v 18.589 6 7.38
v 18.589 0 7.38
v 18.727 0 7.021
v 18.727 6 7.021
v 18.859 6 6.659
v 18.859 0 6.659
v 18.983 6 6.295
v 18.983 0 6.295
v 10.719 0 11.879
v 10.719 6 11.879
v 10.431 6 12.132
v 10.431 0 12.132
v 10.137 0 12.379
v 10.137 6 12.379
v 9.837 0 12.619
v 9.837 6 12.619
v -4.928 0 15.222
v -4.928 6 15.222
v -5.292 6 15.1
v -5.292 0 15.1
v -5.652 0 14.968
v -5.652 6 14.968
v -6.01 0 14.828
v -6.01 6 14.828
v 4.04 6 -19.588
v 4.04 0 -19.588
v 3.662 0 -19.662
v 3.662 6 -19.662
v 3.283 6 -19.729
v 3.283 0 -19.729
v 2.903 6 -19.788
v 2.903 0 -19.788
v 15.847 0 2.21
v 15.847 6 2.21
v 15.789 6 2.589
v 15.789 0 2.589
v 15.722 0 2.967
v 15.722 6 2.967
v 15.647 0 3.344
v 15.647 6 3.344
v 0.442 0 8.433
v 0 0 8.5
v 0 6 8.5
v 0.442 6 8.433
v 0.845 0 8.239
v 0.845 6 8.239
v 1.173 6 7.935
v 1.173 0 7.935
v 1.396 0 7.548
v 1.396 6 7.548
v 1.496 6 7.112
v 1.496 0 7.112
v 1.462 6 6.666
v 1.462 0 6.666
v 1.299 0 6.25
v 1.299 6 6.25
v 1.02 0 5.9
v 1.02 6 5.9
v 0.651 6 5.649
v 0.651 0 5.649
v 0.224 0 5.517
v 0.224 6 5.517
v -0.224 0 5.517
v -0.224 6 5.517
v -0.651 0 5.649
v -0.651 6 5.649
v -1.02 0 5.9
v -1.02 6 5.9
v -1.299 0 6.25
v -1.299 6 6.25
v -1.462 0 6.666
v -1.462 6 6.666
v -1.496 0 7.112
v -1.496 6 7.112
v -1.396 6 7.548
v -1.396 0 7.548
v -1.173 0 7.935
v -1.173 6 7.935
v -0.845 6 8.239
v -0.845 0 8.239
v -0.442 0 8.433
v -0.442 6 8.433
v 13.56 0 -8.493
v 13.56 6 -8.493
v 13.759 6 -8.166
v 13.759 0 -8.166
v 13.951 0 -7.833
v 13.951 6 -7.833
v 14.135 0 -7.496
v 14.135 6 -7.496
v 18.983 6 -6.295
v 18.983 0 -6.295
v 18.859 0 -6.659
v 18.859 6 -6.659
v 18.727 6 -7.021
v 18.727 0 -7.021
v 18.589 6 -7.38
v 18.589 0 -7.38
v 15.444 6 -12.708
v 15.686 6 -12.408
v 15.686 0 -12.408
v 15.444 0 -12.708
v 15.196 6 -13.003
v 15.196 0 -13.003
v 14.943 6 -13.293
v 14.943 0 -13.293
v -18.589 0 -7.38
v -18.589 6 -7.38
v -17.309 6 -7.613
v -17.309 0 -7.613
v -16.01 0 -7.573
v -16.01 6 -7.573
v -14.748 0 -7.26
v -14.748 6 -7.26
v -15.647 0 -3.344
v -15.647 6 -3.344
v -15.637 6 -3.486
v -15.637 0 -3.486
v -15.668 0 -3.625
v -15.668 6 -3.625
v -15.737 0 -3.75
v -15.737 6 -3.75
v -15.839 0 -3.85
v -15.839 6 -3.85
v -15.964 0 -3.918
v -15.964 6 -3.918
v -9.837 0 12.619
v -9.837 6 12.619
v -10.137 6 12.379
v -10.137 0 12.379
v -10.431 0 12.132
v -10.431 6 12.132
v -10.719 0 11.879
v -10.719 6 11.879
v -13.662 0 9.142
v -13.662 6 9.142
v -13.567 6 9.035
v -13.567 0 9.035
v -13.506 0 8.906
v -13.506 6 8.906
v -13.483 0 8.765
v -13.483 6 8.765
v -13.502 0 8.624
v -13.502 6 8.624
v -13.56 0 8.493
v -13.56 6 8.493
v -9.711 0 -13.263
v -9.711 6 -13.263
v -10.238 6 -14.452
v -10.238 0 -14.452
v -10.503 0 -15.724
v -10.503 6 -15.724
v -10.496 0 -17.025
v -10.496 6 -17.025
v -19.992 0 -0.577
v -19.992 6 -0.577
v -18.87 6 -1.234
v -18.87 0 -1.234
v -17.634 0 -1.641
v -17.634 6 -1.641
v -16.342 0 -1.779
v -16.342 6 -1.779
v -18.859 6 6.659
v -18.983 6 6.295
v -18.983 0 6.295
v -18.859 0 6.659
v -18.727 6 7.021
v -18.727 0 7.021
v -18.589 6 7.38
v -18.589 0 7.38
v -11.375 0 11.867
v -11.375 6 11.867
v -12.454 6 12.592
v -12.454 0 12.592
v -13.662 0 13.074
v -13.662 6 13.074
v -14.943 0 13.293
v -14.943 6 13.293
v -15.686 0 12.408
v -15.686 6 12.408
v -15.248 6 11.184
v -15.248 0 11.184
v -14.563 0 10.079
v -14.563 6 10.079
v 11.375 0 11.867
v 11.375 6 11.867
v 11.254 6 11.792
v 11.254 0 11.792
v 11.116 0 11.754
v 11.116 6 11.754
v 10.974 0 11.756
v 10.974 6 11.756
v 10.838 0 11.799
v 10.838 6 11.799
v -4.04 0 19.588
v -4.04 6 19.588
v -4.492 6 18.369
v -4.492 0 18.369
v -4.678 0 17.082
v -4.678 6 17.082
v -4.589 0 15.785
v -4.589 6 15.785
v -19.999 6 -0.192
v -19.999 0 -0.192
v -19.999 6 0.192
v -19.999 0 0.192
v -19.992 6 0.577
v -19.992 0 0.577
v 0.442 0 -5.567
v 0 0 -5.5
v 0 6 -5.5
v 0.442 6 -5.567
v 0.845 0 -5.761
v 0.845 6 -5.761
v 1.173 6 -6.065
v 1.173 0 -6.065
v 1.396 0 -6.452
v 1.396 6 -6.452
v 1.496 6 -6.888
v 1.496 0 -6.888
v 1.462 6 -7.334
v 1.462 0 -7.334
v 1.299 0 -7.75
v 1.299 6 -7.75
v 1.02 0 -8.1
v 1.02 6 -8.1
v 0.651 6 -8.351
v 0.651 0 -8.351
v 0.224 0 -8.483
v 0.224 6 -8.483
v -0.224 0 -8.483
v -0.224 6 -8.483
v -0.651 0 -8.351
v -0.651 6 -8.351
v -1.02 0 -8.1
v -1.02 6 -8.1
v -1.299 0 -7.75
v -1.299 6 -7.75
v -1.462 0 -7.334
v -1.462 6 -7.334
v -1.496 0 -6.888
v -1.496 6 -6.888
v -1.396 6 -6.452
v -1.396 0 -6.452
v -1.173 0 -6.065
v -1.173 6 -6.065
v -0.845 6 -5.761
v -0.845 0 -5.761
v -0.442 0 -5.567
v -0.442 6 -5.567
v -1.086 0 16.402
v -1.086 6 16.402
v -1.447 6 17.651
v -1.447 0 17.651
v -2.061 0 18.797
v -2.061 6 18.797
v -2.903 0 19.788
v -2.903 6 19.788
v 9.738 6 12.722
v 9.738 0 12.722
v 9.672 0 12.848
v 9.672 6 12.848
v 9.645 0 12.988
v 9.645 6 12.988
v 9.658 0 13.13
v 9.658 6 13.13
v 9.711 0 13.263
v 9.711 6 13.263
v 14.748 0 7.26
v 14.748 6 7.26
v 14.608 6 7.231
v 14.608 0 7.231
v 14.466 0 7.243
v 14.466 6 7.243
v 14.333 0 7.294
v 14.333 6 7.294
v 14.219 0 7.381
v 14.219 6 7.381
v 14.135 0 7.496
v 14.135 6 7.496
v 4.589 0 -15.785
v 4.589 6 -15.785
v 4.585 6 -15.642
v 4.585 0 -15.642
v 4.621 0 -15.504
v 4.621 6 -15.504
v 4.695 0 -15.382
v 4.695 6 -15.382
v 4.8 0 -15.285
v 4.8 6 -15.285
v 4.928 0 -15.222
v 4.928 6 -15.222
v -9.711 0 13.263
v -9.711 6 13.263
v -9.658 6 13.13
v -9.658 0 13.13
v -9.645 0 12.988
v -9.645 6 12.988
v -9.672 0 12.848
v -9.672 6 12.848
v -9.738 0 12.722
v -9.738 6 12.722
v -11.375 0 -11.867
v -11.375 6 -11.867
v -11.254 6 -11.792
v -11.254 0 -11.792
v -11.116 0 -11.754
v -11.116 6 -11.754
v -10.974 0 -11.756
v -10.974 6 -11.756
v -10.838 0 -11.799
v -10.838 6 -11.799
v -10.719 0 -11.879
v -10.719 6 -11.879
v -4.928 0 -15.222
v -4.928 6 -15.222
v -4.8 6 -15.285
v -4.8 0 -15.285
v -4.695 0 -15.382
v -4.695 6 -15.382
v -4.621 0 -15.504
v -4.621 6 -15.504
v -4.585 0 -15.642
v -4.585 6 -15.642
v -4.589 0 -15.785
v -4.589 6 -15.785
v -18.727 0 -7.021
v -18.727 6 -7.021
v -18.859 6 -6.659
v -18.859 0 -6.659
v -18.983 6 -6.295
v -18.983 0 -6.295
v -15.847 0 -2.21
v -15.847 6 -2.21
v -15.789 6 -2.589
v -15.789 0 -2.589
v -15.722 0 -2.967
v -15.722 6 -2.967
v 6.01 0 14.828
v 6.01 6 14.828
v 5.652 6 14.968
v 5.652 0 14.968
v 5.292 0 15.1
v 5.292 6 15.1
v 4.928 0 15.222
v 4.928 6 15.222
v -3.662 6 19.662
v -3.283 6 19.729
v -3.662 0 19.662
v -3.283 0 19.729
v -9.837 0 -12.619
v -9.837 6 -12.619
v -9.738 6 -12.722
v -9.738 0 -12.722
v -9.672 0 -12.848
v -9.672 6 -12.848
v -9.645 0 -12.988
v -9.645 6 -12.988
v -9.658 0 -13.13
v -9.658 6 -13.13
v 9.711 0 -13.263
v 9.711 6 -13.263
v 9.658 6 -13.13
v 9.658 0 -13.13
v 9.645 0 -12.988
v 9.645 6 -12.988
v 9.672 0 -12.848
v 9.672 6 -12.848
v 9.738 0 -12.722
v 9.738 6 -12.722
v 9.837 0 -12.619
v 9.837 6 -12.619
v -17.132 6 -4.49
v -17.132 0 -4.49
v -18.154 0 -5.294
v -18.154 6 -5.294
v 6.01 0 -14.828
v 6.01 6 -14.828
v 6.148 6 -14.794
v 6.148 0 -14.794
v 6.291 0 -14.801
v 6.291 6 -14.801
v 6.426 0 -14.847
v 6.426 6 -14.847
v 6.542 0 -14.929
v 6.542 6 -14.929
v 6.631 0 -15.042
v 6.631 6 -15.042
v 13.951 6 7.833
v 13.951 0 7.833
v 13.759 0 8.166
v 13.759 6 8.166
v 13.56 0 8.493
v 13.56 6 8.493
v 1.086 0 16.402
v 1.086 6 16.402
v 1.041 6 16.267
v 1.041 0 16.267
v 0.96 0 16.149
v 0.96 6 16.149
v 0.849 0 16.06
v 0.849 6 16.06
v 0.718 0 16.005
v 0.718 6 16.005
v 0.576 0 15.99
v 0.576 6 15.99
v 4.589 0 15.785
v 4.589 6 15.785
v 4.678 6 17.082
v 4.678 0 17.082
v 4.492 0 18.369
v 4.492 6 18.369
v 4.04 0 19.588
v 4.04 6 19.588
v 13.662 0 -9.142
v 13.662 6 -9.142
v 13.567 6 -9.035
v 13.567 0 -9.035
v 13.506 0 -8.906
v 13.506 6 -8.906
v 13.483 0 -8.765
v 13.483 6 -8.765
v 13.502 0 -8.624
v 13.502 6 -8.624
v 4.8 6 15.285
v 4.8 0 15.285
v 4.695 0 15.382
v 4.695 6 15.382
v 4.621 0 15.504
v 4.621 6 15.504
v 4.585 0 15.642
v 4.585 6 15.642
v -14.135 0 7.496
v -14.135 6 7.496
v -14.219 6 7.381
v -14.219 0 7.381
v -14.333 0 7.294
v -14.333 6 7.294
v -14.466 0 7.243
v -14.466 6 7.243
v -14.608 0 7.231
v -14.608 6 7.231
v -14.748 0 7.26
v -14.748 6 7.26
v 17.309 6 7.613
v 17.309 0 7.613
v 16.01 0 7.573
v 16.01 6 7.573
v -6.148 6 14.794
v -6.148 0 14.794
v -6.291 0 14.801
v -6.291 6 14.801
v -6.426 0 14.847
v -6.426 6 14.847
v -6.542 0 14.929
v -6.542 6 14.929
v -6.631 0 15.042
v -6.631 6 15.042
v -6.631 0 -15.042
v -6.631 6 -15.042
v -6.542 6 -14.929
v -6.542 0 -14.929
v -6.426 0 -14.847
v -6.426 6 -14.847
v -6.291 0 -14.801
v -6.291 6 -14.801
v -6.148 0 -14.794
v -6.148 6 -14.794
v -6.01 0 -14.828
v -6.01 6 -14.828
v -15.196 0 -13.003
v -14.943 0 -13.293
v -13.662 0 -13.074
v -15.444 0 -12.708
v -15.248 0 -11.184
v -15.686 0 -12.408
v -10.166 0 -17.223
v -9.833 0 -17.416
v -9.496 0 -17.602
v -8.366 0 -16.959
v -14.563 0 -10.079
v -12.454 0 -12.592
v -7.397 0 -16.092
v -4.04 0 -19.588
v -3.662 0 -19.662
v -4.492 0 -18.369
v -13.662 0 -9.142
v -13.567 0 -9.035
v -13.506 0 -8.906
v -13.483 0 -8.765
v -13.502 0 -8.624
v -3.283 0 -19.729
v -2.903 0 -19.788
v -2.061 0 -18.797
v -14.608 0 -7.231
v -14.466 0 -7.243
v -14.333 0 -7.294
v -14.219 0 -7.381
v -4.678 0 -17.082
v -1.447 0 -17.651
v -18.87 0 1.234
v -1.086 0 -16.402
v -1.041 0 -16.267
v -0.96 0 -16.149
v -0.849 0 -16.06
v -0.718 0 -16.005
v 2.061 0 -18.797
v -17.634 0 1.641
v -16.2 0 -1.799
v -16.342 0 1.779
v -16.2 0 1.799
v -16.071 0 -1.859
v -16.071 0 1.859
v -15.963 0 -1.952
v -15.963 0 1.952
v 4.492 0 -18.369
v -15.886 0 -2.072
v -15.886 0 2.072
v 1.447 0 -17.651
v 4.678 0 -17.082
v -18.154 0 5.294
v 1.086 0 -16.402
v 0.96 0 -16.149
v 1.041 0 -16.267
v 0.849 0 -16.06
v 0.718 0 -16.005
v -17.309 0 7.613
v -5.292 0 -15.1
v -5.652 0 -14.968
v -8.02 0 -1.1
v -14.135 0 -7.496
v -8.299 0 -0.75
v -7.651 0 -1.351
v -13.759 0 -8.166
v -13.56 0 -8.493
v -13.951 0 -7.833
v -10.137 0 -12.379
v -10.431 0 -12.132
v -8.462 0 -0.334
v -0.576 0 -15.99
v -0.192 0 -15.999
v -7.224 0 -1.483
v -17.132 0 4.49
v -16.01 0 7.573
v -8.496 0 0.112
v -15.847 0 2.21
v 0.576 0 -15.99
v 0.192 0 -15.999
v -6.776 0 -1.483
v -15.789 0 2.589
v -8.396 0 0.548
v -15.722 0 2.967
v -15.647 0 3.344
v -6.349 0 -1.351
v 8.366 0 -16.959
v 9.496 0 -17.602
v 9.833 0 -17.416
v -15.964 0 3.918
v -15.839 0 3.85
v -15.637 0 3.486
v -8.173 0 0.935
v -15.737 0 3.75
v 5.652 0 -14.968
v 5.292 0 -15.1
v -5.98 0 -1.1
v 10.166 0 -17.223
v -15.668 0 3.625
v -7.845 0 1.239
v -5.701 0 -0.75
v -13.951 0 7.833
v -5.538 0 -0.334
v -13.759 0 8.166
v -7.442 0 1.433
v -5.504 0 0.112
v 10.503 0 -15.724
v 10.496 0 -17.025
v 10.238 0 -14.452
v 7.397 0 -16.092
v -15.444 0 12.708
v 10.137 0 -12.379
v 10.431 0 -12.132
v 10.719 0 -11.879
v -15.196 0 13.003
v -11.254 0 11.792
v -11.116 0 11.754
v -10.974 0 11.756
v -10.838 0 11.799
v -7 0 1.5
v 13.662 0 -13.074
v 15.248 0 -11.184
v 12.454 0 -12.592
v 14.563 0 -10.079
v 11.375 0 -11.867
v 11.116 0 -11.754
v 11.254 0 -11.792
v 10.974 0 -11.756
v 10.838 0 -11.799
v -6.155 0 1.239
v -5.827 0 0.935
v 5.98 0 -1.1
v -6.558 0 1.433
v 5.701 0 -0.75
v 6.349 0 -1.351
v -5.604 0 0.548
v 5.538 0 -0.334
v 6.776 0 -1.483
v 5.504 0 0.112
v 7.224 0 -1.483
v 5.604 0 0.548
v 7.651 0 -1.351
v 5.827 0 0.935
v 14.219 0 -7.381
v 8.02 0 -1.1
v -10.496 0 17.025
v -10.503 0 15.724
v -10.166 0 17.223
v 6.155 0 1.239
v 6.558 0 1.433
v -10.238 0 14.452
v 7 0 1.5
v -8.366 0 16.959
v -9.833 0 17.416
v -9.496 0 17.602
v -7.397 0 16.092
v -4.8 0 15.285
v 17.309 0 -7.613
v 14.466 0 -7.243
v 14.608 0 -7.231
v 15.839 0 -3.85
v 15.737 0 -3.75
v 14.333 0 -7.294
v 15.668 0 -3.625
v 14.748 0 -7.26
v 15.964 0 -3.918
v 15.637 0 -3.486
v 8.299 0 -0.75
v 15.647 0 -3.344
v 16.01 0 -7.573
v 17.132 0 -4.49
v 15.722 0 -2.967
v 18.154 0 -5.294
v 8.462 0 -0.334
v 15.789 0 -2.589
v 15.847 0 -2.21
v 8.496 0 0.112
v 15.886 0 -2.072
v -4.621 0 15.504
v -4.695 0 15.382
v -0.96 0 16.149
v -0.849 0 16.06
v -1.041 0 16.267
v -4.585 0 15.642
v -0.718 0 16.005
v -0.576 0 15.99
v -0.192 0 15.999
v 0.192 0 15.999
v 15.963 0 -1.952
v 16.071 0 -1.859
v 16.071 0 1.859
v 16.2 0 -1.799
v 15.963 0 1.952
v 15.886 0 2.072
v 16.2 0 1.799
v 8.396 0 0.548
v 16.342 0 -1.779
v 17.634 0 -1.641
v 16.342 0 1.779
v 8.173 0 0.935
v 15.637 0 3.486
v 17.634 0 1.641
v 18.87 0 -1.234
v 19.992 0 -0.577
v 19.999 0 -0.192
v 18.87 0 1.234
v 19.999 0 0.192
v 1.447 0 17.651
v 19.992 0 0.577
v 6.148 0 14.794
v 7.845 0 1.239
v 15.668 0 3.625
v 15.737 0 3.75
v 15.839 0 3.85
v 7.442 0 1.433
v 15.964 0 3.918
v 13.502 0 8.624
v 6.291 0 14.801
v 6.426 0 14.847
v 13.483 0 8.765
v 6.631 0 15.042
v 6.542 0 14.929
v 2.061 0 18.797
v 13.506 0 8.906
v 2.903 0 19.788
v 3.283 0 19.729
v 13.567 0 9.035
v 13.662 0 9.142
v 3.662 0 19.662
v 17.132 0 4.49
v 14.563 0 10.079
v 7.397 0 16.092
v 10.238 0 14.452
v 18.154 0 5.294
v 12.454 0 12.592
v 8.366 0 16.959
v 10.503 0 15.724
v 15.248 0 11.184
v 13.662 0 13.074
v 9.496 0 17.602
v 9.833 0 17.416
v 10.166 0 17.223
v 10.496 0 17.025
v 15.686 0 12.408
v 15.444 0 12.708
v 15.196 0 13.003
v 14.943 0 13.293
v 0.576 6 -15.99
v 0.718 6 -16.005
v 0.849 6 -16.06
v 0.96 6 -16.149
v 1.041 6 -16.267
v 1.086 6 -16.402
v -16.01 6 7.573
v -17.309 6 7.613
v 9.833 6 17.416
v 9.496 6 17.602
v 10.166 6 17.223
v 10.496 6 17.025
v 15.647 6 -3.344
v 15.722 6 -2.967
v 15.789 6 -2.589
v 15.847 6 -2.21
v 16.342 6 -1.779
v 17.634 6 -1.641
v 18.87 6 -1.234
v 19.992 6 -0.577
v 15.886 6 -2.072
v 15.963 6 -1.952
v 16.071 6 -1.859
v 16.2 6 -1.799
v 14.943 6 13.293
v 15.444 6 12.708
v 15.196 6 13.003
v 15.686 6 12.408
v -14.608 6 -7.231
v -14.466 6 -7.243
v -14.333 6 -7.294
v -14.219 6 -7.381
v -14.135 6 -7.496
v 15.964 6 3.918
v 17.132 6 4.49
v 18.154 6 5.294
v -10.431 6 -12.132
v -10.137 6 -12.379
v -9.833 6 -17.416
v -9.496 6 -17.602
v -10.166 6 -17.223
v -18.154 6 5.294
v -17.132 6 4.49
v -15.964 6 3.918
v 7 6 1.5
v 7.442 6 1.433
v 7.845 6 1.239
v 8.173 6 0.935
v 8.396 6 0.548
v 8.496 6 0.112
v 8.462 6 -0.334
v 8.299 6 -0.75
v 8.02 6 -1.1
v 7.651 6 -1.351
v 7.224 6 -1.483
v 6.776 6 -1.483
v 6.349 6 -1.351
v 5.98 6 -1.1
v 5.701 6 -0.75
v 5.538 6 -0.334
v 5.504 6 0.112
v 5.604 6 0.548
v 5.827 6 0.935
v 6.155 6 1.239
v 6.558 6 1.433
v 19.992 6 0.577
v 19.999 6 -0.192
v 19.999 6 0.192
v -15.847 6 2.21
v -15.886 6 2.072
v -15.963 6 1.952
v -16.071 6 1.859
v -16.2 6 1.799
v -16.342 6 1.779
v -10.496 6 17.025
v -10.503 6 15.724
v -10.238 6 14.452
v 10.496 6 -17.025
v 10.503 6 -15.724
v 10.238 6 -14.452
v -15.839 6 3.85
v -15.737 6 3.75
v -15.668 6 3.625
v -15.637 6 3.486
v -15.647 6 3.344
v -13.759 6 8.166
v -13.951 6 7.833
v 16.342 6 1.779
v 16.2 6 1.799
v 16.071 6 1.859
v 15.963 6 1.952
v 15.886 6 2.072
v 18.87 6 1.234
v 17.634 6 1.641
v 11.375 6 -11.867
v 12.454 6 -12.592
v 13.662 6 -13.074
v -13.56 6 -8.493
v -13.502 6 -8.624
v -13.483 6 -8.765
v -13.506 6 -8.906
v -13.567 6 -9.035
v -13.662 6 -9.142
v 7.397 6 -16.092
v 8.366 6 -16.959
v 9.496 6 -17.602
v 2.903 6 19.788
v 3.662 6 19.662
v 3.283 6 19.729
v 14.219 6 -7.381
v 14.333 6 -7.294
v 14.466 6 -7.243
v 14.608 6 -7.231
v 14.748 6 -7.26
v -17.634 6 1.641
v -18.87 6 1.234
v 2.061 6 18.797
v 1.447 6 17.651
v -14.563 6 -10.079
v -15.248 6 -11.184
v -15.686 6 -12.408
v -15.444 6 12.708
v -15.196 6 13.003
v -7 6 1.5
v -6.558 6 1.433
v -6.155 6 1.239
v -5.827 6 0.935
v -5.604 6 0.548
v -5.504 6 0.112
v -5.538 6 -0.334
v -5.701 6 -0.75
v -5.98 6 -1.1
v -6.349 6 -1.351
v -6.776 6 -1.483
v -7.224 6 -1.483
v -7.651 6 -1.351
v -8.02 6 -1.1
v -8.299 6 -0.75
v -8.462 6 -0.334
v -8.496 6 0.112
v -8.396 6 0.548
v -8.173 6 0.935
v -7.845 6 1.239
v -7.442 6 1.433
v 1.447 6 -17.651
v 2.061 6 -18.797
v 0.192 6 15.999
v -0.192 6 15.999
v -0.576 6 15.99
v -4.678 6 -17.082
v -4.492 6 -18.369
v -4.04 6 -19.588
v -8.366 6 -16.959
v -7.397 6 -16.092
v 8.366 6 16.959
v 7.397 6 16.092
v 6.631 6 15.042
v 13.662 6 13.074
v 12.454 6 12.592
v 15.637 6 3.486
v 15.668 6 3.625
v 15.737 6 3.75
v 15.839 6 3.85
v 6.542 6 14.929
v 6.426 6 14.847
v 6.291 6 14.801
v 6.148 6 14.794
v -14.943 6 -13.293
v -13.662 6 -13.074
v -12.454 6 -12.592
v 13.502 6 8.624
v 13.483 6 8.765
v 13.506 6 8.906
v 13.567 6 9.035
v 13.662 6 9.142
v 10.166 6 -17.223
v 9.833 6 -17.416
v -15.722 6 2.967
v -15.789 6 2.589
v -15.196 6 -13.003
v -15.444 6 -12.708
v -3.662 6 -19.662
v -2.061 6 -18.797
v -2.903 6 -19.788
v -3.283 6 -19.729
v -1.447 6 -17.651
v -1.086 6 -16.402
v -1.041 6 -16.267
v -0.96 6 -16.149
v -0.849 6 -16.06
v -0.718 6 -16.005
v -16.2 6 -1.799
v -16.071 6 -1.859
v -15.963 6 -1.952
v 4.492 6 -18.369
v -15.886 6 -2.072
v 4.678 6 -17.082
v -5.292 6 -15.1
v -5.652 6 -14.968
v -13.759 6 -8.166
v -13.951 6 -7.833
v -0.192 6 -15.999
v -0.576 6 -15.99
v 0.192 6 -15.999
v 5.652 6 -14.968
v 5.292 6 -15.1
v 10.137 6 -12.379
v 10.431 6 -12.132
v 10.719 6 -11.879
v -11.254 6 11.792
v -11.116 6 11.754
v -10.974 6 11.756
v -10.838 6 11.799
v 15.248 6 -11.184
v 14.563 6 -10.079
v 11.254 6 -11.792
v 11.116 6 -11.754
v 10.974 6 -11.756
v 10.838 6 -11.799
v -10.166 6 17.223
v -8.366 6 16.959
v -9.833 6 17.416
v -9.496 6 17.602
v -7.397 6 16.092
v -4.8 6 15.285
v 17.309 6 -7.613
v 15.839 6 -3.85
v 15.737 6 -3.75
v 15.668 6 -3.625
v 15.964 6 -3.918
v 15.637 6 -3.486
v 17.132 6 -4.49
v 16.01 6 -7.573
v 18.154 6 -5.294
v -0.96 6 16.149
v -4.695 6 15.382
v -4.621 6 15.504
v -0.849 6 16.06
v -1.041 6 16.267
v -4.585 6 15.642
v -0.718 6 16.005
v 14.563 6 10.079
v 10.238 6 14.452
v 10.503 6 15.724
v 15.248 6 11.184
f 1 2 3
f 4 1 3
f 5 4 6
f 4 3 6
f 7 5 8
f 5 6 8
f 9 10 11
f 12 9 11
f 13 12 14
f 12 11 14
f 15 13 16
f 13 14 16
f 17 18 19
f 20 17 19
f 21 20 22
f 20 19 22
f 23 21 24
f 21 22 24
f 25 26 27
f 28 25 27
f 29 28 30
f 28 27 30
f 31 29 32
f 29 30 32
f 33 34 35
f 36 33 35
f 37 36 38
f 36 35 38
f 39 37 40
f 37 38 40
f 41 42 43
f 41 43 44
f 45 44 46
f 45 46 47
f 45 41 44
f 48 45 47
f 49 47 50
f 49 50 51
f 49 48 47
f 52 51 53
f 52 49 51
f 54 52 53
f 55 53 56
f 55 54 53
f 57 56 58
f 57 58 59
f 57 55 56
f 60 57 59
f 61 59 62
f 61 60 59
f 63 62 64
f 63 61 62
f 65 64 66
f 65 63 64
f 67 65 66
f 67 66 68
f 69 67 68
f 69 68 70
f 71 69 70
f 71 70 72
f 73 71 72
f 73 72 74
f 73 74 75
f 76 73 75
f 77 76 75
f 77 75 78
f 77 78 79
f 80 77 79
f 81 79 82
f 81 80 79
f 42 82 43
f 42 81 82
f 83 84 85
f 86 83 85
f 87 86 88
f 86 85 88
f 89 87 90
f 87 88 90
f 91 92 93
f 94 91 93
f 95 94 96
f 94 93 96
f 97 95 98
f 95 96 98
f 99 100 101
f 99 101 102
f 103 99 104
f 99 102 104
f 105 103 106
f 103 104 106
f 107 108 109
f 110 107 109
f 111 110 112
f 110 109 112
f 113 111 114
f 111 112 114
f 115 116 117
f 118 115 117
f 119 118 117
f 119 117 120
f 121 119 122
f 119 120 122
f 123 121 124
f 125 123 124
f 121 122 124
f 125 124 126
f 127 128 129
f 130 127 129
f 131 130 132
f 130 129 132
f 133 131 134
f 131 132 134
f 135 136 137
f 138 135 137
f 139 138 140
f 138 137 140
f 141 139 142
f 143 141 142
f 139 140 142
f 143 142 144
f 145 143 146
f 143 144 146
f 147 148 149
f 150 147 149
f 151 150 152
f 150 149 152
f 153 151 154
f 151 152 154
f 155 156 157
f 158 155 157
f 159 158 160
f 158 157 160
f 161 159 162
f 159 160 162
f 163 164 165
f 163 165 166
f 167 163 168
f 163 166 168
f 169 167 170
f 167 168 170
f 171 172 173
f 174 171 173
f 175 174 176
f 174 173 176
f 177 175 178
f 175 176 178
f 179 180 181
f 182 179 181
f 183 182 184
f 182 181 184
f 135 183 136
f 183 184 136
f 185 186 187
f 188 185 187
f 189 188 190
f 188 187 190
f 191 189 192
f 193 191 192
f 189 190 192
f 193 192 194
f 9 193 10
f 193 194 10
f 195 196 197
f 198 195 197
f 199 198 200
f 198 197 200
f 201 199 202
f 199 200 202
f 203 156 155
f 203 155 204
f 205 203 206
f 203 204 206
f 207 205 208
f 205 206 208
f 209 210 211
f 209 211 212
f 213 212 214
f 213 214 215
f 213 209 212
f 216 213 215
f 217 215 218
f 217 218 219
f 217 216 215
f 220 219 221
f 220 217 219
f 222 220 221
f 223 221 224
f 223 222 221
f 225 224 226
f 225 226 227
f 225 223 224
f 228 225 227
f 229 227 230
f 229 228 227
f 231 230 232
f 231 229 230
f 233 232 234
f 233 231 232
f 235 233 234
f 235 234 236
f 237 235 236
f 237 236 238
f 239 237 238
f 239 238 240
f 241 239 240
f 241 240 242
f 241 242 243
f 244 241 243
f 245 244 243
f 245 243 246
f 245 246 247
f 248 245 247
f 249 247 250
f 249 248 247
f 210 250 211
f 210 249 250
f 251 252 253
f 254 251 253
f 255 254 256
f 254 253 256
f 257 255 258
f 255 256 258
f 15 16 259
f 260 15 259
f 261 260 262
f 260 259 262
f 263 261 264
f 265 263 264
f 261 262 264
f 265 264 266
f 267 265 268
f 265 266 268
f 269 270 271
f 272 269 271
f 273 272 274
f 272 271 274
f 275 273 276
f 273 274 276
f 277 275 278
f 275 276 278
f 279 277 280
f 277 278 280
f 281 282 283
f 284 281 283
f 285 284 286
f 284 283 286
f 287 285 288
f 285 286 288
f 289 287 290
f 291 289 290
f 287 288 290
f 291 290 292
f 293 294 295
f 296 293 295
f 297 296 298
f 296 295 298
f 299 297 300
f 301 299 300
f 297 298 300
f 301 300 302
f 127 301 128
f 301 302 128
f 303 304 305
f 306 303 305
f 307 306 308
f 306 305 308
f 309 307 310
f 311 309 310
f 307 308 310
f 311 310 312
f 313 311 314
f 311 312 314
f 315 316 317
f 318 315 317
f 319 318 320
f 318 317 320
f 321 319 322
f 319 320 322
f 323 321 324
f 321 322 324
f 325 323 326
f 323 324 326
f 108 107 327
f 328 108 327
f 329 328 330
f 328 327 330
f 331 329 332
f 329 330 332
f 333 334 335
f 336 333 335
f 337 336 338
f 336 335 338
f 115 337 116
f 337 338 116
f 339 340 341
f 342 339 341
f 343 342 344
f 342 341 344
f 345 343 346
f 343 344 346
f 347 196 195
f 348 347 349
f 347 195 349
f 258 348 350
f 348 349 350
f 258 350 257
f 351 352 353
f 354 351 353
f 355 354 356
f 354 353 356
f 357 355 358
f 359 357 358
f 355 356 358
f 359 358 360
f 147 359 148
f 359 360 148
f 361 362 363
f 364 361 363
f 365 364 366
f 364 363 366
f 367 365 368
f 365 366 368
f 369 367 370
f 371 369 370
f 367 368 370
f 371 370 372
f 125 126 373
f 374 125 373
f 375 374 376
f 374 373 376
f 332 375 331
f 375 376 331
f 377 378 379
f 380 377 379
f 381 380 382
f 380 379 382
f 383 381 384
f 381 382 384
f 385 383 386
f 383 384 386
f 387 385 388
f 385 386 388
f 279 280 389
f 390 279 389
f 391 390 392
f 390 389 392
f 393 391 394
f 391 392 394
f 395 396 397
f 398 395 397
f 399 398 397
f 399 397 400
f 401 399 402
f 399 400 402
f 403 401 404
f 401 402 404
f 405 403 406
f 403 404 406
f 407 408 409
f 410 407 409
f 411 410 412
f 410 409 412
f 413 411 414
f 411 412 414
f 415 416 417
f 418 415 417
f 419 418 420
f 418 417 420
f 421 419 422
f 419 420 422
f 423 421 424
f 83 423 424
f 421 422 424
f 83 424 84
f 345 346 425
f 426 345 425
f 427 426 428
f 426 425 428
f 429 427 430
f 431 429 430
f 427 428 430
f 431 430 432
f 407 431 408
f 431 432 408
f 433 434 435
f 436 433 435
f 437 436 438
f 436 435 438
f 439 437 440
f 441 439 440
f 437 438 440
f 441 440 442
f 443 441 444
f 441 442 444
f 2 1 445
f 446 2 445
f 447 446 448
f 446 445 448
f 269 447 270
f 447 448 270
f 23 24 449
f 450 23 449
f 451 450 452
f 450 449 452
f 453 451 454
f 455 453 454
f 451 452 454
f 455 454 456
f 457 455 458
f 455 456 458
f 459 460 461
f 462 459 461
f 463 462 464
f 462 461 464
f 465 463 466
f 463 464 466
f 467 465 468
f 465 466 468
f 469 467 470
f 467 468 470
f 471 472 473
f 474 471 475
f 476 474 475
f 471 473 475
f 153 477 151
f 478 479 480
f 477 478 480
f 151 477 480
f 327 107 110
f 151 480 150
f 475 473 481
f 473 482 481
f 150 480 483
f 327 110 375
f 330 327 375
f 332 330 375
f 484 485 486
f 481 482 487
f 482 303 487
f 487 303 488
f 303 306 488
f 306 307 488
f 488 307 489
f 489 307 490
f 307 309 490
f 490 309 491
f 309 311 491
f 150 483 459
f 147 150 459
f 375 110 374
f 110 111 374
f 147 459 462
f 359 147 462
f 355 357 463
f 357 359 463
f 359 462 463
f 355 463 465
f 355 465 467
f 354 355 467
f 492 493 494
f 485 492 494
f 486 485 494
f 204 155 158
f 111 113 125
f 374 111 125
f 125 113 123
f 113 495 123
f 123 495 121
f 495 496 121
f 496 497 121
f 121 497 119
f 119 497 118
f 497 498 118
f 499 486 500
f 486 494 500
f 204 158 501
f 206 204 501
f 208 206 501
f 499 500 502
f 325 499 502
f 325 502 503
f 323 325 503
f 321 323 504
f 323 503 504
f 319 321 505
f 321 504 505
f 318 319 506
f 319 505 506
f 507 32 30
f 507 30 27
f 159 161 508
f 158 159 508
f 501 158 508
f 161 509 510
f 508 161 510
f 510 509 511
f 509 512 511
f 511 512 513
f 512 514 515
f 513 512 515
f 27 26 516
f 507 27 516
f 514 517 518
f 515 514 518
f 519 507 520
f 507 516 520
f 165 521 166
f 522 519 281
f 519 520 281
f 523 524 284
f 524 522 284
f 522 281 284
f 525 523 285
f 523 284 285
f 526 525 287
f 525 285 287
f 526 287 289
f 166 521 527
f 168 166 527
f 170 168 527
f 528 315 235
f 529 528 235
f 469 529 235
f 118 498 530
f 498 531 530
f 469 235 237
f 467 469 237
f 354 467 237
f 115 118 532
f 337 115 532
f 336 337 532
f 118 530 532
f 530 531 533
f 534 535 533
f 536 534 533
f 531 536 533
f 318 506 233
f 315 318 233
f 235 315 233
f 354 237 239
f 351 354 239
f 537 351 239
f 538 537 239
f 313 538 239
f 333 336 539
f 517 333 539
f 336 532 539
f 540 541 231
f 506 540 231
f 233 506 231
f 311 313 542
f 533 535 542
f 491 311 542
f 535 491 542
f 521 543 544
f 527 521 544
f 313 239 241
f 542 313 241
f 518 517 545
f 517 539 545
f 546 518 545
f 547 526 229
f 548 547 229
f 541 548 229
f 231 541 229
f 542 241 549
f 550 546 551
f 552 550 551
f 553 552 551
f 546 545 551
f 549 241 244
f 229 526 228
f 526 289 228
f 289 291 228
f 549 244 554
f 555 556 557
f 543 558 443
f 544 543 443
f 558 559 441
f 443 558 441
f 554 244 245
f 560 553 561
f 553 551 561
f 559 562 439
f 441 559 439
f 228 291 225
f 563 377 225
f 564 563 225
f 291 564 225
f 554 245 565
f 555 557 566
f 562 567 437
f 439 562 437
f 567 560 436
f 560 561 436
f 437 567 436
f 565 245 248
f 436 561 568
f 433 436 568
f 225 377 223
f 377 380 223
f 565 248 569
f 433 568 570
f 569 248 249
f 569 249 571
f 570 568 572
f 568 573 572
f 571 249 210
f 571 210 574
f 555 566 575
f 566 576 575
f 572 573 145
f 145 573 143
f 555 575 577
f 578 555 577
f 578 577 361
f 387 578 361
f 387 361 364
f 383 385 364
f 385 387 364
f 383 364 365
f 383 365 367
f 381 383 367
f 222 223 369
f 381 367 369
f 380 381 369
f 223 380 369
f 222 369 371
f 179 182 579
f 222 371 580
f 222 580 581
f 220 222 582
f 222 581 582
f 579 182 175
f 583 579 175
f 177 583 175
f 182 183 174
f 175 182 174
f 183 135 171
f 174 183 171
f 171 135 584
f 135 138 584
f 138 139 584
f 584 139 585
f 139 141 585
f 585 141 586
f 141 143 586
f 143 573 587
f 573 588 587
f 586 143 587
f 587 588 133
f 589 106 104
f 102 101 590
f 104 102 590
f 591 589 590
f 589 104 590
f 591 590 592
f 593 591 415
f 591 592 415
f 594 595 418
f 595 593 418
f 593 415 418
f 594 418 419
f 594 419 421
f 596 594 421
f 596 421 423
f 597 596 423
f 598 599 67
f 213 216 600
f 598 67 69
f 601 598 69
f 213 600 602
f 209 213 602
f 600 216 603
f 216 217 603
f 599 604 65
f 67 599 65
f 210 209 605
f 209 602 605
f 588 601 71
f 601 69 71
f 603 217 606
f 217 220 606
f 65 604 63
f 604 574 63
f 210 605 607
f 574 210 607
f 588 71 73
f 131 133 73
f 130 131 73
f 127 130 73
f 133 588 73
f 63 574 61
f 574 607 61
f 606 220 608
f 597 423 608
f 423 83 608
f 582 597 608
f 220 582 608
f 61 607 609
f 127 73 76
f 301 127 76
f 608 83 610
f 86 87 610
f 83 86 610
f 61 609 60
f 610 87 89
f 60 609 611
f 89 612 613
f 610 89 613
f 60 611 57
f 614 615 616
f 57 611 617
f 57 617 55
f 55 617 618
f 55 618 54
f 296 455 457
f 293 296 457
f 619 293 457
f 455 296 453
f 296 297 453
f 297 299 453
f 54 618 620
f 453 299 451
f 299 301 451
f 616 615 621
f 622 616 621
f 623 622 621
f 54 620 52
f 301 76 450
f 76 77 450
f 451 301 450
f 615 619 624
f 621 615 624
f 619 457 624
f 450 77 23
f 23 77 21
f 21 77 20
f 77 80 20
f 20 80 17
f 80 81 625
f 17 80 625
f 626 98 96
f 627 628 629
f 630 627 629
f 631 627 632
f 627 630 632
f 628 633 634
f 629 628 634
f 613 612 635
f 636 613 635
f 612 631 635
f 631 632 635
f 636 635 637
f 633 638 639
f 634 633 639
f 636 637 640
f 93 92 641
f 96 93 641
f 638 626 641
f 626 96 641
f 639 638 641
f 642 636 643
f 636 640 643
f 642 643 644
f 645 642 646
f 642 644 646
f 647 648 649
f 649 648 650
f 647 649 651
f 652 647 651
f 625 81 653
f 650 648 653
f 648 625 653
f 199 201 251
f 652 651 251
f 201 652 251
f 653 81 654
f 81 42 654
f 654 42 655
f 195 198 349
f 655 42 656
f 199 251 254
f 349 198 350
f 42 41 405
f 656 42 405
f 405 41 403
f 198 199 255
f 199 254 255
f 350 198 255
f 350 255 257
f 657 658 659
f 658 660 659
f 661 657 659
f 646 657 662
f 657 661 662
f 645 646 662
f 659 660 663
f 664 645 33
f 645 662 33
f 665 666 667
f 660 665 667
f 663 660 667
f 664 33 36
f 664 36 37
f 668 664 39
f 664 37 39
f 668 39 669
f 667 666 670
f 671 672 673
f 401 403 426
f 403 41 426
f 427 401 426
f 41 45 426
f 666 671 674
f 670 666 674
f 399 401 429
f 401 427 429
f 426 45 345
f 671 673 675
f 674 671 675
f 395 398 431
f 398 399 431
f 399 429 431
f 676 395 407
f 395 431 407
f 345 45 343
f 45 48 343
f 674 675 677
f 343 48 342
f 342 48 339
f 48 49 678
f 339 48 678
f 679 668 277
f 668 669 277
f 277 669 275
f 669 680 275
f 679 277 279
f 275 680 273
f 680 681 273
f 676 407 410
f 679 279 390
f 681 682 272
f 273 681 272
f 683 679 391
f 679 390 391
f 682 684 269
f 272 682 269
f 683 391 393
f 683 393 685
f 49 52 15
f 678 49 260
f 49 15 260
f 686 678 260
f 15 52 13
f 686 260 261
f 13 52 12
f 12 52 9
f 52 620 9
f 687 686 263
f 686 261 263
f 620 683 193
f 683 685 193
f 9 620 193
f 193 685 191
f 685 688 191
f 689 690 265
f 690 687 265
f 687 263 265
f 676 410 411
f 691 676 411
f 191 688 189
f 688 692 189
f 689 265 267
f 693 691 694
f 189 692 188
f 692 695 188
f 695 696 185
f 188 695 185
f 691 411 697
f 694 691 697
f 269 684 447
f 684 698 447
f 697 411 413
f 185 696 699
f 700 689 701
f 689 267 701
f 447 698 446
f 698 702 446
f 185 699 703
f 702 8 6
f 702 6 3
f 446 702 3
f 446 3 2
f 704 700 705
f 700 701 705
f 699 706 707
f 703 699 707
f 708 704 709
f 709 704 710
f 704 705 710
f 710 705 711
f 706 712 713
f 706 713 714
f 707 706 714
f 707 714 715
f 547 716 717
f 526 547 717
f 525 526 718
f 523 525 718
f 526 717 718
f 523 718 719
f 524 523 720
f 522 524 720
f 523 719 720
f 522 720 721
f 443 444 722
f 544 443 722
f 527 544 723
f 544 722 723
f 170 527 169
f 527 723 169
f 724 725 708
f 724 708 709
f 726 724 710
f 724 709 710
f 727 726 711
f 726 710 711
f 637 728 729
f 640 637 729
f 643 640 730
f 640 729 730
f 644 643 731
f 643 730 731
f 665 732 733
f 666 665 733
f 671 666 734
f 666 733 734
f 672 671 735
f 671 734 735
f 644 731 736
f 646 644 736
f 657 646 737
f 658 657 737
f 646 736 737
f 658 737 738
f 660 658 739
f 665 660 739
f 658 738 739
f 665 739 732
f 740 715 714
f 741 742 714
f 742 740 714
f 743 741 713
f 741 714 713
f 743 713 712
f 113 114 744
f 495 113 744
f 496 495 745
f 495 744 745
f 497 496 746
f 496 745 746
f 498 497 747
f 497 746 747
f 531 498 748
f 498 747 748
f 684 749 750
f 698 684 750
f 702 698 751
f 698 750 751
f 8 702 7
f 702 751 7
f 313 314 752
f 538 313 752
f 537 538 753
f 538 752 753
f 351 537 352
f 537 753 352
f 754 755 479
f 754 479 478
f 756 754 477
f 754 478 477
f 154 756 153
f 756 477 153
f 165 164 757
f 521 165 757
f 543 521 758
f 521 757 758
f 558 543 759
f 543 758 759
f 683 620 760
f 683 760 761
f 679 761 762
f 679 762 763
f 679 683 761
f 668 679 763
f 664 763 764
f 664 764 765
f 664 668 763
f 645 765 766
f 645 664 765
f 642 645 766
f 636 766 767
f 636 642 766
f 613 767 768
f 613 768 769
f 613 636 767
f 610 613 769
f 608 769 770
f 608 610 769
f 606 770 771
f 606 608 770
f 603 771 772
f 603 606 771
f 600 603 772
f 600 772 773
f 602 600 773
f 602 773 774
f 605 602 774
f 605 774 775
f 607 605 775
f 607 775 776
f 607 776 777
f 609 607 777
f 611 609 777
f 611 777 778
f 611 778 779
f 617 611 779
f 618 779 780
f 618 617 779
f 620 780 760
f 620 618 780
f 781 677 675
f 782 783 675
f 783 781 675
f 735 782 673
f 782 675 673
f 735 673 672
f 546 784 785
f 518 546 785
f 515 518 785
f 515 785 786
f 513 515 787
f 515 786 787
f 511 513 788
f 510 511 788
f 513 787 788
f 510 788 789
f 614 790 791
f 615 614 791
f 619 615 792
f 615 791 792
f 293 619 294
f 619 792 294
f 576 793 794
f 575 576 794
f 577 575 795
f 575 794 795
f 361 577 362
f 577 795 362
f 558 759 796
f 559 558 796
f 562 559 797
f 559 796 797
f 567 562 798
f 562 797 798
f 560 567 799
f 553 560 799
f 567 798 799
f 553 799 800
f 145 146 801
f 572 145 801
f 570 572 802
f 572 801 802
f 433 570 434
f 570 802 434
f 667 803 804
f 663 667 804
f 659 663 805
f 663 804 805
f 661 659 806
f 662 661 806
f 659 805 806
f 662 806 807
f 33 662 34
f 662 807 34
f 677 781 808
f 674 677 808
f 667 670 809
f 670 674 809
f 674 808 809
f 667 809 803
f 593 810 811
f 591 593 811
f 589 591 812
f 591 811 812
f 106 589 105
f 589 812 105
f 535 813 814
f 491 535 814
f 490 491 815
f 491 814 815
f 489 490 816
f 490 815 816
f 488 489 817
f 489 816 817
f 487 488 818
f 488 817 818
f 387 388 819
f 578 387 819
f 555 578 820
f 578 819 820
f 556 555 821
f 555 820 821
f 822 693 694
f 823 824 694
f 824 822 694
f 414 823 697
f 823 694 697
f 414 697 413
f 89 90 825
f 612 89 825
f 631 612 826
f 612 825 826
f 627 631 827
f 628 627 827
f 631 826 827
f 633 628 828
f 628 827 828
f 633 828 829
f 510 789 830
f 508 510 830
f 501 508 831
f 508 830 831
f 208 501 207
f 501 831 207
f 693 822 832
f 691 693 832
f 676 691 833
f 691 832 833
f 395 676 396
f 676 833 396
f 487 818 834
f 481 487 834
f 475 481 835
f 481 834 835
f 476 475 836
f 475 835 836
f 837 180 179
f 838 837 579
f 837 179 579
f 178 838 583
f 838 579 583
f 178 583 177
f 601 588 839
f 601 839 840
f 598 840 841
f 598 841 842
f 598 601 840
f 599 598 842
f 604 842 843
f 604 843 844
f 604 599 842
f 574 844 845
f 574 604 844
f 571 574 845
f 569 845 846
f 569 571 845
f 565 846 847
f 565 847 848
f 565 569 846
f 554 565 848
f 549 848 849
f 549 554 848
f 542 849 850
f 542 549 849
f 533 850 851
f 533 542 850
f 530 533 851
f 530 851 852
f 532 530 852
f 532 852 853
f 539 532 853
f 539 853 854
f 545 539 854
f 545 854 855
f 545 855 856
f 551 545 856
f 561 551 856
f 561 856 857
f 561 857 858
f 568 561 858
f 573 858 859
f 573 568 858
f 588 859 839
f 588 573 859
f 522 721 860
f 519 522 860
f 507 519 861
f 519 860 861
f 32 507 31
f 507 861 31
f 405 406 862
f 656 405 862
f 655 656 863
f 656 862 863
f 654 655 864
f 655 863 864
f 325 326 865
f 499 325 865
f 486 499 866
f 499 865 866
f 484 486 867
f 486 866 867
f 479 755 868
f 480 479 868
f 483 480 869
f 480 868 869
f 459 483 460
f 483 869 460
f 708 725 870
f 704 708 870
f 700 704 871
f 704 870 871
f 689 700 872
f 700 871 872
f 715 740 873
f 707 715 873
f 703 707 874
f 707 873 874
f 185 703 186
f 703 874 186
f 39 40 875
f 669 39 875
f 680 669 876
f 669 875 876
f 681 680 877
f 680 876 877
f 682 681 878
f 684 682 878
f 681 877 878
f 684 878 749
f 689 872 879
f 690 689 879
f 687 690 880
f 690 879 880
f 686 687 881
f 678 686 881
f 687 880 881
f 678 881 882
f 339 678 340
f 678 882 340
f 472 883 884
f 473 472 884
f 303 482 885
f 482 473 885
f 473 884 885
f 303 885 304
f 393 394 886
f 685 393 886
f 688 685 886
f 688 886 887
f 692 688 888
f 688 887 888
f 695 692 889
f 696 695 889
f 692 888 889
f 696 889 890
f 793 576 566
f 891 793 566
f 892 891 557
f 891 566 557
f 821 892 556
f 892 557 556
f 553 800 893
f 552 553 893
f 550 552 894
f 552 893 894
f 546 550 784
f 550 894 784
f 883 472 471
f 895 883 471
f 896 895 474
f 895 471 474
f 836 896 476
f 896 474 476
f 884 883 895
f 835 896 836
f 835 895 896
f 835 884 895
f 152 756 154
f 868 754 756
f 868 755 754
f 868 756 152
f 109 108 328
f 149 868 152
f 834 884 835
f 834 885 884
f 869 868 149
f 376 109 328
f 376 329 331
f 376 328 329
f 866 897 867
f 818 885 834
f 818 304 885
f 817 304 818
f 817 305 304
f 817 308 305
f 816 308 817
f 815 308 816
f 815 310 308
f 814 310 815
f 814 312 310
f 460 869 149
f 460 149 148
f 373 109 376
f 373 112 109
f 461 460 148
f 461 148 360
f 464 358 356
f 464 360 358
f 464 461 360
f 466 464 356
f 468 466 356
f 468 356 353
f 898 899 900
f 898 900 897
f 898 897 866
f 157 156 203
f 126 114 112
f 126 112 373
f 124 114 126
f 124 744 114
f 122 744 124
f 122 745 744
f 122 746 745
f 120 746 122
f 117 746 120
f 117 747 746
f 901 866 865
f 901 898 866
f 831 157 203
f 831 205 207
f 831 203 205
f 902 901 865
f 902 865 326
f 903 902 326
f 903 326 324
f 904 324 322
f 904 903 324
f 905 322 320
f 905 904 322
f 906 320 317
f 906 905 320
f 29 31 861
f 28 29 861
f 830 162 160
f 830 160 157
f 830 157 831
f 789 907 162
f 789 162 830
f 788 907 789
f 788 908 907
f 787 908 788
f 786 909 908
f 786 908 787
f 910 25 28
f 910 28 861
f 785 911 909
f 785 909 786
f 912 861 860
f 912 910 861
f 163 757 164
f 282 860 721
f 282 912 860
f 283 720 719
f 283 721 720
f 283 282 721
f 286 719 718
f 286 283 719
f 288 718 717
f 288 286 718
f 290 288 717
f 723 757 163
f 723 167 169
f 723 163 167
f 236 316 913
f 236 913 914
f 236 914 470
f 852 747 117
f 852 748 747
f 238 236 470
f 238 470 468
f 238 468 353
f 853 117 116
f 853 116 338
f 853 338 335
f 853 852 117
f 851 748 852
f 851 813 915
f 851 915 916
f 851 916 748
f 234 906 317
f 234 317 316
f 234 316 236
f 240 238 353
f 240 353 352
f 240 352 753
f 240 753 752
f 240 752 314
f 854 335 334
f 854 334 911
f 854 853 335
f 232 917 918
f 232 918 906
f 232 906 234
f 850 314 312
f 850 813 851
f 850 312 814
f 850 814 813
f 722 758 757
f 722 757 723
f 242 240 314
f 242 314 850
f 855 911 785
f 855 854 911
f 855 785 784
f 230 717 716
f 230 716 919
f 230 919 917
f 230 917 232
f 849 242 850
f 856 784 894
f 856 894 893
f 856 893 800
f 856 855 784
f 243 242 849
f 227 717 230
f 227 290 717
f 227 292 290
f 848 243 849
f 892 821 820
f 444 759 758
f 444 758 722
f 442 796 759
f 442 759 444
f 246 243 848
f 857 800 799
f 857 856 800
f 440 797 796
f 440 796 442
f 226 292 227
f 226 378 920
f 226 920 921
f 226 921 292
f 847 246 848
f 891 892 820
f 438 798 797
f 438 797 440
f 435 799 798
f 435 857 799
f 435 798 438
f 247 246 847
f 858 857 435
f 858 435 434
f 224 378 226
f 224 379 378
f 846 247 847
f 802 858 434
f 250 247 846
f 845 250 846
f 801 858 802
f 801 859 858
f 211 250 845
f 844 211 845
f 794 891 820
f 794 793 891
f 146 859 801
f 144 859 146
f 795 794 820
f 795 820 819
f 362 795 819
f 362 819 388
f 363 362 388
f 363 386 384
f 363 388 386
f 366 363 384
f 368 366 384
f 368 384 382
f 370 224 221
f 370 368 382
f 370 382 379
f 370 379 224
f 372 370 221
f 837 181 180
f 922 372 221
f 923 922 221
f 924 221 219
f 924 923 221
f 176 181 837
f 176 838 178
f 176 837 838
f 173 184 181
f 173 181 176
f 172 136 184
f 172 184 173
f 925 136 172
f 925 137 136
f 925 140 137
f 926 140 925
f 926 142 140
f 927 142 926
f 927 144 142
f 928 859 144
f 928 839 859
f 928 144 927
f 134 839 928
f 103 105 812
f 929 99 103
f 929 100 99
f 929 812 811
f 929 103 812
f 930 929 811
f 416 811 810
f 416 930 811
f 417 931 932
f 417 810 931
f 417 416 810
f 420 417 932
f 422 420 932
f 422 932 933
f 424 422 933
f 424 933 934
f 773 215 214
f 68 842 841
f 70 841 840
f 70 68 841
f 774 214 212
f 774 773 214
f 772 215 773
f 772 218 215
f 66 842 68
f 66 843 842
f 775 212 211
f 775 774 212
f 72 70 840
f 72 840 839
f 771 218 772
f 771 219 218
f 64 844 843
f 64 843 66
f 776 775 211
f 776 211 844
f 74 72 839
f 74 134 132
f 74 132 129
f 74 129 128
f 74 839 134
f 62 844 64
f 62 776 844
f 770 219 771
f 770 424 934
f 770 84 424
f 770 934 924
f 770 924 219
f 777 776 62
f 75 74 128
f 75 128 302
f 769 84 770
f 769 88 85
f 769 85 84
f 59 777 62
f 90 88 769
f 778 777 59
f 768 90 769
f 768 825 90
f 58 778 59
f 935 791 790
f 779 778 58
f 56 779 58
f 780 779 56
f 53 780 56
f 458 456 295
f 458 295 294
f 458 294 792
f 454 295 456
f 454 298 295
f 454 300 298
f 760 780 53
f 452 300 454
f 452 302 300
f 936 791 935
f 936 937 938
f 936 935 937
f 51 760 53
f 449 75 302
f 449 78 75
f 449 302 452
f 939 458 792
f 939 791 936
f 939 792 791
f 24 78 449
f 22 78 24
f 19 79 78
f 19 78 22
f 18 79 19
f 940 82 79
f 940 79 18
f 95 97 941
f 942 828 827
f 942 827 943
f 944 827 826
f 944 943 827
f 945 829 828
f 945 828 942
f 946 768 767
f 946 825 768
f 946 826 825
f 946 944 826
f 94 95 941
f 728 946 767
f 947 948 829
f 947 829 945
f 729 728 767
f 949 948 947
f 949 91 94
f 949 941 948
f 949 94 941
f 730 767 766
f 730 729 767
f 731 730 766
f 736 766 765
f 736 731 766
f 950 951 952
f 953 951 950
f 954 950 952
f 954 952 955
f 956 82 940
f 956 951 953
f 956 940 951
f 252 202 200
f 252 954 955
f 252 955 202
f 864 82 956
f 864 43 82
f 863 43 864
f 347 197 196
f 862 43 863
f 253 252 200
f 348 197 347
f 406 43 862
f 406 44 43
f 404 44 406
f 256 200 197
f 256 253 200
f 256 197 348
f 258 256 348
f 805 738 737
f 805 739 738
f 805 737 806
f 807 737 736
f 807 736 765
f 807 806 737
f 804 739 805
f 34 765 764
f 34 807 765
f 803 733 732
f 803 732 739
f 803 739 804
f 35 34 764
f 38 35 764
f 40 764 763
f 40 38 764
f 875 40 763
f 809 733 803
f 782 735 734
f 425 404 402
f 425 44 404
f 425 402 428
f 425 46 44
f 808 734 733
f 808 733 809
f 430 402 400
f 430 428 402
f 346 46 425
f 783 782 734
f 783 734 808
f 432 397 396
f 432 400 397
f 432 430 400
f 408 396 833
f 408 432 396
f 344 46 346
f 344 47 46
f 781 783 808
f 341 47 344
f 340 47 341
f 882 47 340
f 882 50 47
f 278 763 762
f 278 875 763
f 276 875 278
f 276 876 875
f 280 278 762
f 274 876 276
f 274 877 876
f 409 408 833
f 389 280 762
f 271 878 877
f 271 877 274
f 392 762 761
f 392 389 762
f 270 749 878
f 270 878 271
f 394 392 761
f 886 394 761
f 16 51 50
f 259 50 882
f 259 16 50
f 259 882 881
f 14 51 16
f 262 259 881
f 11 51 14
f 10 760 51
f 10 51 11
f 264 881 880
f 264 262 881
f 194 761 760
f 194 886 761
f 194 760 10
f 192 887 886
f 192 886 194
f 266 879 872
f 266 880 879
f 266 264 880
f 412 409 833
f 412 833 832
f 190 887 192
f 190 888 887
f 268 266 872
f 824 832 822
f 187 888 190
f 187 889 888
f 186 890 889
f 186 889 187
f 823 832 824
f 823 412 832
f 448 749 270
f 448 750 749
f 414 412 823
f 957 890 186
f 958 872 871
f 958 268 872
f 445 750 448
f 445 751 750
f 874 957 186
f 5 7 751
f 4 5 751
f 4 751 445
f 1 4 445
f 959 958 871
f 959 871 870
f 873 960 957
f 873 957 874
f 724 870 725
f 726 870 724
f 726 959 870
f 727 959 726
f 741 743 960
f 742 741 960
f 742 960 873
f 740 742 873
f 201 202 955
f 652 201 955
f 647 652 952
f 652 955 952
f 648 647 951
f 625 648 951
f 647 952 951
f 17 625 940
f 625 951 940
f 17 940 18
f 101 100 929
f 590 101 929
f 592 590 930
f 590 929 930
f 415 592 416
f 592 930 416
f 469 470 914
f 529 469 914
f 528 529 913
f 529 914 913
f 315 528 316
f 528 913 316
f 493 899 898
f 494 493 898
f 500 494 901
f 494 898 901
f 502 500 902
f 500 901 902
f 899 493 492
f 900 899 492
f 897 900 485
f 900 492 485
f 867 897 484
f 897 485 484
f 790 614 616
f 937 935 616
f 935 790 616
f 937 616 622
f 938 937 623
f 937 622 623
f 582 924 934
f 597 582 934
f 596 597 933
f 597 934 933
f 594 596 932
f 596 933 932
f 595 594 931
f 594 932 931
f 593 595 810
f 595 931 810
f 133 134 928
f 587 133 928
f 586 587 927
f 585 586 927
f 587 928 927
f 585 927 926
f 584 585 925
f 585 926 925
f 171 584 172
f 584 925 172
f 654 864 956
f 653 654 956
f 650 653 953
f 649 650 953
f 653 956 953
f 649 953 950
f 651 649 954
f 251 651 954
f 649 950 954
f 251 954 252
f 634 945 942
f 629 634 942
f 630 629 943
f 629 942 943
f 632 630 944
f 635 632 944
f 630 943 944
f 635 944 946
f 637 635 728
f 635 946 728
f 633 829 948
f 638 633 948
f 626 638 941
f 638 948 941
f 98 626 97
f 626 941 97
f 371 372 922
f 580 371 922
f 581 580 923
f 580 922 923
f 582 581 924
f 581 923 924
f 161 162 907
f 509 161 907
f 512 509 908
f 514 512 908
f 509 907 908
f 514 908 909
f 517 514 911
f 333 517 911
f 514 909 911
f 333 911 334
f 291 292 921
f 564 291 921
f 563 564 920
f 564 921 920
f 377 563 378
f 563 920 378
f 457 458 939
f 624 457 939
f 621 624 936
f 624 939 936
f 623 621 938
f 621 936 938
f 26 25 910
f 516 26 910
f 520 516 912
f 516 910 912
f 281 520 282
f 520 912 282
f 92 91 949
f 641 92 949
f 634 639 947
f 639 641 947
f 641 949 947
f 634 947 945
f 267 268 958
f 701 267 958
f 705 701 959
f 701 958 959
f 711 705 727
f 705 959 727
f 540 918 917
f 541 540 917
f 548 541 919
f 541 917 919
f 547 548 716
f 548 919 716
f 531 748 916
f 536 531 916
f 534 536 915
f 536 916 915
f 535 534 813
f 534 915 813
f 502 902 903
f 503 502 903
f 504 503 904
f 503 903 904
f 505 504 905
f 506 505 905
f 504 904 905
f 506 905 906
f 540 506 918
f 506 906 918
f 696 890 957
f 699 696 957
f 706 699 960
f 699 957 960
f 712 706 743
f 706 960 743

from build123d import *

# Parameters (mm, degrees)
SKETCH_1_R               = 20
SKETCH_1_R_2             = 1.5
EXTRUDE_1_DEPTH          = 6
CUT_EXTRUDE_1_DEPTH      = 29.91366459
PATTERN_CIRCULAR_1_COUNT = 18


with BuildPart() as part:
    # 草图1 → 凸台-拉伸1 (new body)
    with BuildSketch(Plane(origin=(0, 0, 0), x_dir=(1, 0, 0), z_dir=(0, 1, 0))):
        with Locations(Location((0, 0, 0), (0, 0, 270))):
            Circle(SKETCH_1_R)
        with Locations(Location((0, 7, 0), (0, 0, 270))):
            Circle(SKETCH_1_R_2, mode=Mode.SUBTRACT)
        with Locations(Location((7, 0, 0), (0, 0, 270))):
            Circle(SKETCH_1_R_2, mode=Mode.SUBTRACT)
        with Locations(Location((0, -7, 0), (0, 0, 270))):
            Circle(SKETCH_1_R_2, mode=Mode.SUBTRACT)
        with Locations(Location((-7, 0, 0), (0, 0, 270))):
            Circle(SKETCH_1_R_2, mode=Mode.SUBTRACT)
    extrude(amount=EXTRUDE_1_DEPTH)

    # 草图2 → 切除-拉伸1 (cut, symmetric)
    with BuildSketch(Plane(origin=(0, 0, 0), x_dir=(1, 0, 0), z_dir=(0, 1, 0))):
        with BuildLine():
            ThreePointArc((2.90303546, 19.78818802), (0, 20), (-2.90303546, 19.78818802))
            ThreePointArc((-2.90303546, 19.78818802), (-1.72363994, 18.240586555), (-1.086139037, 16.402207735))
            ThreePointArc((-1.086139037, 16.402207735), (-0.908122705, 16.100478627), (-0.57579122, 15.989636158))
            ThreePointArc((-0.57579122, 15.989636158), (0, 16), (0.57579122, 15.989636158))
            ThreePointArc((0.57579122, 15.989636158), (0.908122705, 16.100478627), (1.086139037, 16.402207735))
            ThreePointArc((1.086139037, 16.402207735), (1.72363994, 18.240586555), (2.90303546, 19.78818802))
        make_face()
    cut_extrude_1 = extrude(amount=CUT_EXTRUDE_1_DEPTH, both=True, mode=Mode.SUBTRACT)

    # 阵列(圆周)1: 切除-拉伸1 ×18 about axis
    pattern_circular_1_axis = Axis((0, 0, 0), (0, 1, 0))
    for i in range(1, PATTERN_CIRCULAR_1_COUNT):
        add(cut_extrude_1.rotate(pattern_circular_1_axis, i * 360 / PATTERN_CIRCULAR_1_COUNT), mode=Mode.SUBTRACT)


solid = part.part
